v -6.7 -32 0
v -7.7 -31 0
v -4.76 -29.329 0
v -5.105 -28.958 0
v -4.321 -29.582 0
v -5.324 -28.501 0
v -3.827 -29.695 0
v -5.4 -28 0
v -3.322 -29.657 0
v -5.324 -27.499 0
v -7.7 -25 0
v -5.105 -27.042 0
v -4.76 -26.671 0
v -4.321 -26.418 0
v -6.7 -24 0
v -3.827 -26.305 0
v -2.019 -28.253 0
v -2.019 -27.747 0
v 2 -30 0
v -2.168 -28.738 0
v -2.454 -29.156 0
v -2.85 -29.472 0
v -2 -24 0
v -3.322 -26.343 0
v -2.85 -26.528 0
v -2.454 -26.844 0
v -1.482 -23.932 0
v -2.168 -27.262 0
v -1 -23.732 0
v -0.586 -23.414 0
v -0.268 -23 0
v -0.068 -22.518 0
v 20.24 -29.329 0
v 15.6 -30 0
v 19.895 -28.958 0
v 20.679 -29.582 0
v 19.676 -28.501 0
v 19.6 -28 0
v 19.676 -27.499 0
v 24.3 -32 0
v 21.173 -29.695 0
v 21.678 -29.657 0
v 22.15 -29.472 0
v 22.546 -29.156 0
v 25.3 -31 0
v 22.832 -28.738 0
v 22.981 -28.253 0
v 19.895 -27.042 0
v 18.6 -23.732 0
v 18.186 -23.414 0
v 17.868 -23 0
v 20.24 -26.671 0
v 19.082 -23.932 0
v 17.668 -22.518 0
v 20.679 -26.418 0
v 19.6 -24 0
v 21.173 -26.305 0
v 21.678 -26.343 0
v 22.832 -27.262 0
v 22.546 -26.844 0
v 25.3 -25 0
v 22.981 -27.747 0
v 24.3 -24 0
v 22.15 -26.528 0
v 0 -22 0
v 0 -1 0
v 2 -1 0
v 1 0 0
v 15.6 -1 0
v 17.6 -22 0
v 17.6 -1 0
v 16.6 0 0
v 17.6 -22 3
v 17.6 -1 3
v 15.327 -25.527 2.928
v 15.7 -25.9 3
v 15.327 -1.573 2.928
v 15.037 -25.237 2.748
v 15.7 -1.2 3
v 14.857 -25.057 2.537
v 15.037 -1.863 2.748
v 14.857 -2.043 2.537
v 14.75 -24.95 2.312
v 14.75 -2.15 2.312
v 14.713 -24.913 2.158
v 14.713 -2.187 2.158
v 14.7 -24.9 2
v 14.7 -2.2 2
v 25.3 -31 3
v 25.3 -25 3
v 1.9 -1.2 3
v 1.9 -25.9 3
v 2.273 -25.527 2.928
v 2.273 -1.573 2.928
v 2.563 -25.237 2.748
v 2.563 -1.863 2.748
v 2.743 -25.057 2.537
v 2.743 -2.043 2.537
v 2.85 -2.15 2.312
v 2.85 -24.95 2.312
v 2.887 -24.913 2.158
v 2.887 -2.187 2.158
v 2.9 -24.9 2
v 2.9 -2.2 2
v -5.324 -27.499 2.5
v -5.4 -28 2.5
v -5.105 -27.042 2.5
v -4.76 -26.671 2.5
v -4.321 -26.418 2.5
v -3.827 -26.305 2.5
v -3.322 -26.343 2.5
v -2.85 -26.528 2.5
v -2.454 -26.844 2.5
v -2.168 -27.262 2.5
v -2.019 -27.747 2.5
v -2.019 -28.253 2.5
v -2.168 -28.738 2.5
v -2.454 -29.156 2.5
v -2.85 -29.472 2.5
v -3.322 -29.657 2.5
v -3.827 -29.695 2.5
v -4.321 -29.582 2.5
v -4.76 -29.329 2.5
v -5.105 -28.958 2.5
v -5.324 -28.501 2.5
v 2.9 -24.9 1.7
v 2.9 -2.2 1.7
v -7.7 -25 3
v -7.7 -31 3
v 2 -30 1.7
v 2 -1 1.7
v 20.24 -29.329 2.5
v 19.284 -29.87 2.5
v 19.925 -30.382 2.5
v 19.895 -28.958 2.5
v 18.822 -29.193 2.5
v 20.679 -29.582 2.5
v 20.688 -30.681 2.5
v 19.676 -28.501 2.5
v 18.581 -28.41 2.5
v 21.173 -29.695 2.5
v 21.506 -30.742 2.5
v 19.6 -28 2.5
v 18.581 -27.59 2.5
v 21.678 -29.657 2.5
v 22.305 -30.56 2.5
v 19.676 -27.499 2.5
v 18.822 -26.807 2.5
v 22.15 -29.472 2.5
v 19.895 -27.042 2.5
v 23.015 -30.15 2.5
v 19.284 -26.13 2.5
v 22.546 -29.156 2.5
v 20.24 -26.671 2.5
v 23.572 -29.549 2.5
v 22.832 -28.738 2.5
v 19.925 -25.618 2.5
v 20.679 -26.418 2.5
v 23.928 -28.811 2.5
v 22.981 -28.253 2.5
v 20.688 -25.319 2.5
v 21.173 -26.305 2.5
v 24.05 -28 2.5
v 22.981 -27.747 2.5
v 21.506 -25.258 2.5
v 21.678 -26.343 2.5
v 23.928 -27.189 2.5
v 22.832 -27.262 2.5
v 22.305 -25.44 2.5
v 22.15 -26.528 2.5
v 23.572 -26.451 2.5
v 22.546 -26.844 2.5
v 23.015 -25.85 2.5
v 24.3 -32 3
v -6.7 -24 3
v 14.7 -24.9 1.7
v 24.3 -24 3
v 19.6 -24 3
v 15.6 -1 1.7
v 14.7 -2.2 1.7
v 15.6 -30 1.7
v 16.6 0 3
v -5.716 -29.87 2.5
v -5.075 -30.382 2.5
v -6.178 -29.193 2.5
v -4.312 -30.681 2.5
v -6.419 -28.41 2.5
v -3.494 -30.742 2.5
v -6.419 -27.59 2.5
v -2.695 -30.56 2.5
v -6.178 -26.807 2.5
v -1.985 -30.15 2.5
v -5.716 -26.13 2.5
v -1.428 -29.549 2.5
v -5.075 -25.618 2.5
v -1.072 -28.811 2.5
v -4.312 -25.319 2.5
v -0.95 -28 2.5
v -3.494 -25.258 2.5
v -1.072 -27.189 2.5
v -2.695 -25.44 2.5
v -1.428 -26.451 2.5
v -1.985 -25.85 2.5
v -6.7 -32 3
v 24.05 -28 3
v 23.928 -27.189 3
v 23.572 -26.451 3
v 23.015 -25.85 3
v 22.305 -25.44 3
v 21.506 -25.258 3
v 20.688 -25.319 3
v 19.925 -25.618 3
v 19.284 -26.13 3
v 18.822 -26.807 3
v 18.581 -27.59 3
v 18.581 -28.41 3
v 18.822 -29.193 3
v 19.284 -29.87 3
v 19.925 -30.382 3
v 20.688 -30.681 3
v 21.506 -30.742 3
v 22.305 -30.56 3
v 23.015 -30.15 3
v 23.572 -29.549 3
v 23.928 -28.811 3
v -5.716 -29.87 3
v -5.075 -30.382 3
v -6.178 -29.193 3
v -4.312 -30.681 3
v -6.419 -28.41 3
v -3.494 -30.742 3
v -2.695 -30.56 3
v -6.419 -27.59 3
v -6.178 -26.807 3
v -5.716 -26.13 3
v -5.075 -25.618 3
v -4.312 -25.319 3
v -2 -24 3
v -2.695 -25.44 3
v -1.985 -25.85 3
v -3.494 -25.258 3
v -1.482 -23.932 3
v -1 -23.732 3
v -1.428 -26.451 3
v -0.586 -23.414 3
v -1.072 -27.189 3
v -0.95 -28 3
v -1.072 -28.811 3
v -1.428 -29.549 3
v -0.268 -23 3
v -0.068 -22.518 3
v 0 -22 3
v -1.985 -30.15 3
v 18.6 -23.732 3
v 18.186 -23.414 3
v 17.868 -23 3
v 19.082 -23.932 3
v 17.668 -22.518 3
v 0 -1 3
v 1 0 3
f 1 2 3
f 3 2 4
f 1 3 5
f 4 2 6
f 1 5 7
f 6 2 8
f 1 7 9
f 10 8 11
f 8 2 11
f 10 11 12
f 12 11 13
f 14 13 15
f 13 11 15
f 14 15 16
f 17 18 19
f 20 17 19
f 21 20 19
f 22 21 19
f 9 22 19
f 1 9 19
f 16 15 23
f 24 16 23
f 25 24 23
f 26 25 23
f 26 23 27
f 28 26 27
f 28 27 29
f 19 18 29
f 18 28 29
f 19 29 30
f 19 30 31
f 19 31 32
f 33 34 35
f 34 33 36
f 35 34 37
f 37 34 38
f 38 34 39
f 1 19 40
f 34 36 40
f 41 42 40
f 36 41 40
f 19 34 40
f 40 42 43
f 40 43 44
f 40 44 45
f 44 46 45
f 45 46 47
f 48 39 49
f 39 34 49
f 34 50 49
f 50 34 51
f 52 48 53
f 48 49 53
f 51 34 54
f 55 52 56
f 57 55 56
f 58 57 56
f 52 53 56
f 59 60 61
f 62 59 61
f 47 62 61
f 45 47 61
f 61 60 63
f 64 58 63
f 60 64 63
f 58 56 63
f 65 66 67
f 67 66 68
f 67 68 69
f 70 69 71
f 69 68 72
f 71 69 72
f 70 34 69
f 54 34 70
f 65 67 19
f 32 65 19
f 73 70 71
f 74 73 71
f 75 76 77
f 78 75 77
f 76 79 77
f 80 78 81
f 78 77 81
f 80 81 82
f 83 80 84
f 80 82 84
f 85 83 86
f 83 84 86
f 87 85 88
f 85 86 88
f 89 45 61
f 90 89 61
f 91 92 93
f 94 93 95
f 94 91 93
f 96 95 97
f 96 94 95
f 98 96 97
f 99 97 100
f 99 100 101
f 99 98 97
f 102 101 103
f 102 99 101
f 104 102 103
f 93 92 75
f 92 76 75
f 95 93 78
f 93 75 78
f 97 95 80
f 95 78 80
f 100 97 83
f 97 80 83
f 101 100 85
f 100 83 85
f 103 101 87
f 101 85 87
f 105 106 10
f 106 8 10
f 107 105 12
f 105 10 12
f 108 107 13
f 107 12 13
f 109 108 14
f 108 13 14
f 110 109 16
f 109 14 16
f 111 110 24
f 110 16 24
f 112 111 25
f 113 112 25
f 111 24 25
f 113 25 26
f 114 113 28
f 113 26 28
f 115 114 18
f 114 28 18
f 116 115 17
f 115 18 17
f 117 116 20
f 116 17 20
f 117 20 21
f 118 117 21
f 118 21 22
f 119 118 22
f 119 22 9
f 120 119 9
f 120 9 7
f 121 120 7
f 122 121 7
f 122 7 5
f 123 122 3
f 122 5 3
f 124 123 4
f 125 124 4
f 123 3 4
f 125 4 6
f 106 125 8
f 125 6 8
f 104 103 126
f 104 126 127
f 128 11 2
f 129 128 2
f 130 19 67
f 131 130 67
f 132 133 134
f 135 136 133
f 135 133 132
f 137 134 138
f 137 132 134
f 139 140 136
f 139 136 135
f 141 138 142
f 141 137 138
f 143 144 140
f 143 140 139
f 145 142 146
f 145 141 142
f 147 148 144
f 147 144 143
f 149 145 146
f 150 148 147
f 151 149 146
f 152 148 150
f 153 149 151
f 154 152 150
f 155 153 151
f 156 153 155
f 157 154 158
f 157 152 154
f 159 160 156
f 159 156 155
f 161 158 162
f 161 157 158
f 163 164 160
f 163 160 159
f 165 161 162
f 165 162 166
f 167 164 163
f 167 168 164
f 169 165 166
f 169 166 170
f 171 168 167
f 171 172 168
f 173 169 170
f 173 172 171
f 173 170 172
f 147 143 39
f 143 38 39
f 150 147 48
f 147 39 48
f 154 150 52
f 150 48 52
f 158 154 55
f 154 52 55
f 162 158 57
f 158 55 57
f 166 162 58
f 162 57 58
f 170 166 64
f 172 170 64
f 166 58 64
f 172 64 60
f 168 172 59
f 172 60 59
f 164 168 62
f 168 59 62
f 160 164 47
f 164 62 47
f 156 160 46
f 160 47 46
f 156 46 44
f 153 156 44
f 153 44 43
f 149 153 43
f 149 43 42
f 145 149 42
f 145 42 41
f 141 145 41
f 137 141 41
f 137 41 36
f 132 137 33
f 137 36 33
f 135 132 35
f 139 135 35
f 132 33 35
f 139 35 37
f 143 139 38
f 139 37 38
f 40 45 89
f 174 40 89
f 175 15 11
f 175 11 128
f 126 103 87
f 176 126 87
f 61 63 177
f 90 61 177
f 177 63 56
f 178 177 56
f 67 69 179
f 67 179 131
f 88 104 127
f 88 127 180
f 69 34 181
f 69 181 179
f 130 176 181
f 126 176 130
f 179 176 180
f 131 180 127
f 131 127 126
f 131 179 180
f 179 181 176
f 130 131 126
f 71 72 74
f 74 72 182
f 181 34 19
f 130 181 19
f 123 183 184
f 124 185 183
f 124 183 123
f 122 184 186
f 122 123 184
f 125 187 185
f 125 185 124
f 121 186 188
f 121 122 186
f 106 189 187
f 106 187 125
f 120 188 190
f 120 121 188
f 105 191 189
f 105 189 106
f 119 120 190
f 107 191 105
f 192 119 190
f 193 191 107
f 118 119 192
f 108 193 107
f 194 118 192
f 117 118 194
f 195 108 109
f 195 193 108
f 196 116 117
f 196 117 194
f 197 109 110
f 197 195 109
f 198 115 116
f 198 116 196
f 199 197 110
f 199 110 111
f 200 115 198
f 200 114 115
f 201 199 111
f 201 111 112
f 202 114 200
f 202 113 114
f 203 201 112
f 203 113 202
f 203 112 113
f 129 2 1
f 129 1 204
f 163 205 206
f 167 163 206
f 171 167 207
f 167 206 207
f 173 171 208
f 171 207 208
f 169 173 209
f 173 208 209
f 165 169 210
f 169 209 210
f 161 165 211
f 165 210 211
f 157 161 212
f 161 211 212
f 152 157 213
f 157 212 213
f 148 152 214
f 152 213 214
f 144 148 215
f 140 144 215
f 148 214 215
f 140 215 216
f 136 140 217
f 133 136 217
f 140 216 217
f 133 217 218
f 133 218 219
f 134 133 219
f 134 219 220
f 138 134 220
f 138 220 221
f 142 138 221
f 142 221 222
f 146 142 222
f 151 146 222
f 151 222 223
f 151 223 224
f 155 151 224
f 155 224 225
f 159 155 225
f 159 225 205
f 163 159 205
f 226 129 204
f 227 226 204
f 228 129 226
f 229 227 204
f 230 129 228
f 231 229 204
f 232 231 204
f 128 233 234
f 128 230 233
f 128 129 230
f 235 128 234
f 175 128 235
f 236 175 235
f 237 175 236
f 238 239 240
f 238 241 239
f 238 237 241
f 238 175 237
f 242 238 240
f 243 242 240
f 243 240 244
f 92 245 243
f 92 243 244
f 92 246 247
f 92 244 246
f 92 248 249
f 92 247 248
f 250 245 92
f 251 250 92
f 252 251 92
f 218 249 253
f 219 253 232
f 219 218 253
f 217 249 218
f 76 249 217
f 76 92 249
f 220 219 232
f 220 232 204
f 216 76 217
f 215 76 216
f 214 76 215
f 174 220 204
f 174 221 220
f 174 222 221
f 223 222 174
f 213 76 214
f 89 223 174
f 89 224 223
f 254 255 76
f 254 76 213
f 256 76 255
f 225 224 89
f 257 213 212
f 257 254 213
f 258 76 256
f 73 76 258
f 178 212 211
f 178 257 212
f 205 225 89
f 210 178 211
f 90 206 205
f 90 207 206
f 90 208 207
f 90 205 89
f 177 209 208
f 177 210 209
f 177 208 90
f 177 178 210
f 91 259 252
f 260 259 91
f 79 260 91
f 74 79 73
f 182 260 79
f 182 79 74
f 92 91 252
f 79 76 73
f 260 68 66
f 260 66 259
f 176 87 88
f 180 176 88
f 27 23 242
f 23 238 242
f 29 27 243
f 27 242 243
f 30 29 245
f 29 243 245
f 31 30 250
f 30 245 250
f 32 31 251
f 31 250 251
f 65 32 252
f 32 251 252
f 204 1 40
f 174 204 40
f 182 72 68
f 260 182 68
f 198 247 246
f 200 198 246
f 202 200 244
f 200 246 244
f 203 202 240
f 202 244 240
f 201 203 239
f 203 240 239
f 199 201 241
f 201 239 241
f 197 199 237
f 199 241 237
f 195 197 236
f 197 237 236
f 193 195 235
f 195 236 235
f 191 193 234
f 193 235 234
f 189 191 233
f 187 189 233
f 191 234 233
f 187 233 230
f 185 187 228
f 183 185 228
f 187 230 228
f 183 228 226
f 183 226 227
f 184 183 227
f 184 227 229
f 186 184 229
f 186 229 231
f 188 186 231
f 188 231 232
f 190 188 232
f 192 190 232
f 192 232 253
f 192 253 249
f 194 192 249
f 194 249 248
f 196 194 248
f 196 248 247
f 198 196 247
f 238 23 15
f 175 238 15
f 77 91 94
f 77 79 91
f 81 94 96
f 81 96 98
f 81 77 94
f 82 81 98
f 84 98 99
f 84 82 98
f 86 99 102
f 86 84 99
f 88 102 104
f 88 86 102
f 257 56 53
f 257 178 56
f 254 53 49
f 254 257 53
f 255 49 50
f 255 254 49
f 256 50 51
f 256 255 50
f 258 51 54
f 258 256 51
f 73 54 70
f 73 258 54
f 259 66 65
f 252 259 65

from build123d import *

# Parameters (mm, degrees)
EXTRUDE_1_DEPTH              = 3
SKETCH_2_W                   = 13.6
SKETCH_2_H                   = 29
CUT_EXTRUDE_1_DEPTH          = 1.7
SKETCH_3_W                   = 11.8
SKETCH_3_H                   = 22.7
CUT_EXTRUDE_2_DEPTH          = 4
HOLE_WIZARD_M3_1_D           = 3.4
HOLE_WIZARD_M3_1_DEPTH       = 7.5
HOLE_WIZARD_M3_1_CBORE_D     = 5.5
HOLE_WIZARD_M3_1_CBORE_DEPTH = 0.5
HOLE_WIZARD_M3_1_TIP         = 1.021463052
CHAMFER_1_SIZE               = 1
FILLET_1_R                   = 2
FILLET_3_R                   = 1


with BuildPart() as part:
    # 草图1 → 凸台-拉伸1 (new body)
    with BuildSketch(Plane.XY):
        Polygon((-7.7, -32), (25.3, -32), (25.3, -24), (17.6, -24), (17.6, 0), (0, 0), (0, -24), (-7.7, -24), align=None)
    extrude(amount=EXTRUDE_1_DEPTH)

    # 草图2 → 切除-拉伸1 (cut)
    with BuildSketch(Plane(origin=(0, 0, 0), x_dir=(-1, 0, 0), z_dir=(0, 0, -1))):
        with Locations((-8.8, -15.5)):
            Rectangle(SKETCH_2_W, SKETCH_2_H)
    extrude(amount=-CUT_EXTRUDE_1_DEPTH, mode=Mode.SUBTRACT)

    # 草图3 → 切除-拉伸2 (cut, through all)
    with BuildSketch(Plane.XY.offset(3)):
        with Locations((8.8, -13.55)):
            Rectangle(SKETCH_3_W, SKETCH_3_H)
    extrude(amount=-CUT_EXTRUDE_2_DEPTH, mode=Mode.SUBTRACT)

    # M3 六角头螺栓的柱形沉头孔1
    with Locations(Plane.XY.offset(3)):
        with Locations((-3.7, -28), (21.3, -28)):
            CounterBoreHole(HOLE_WIZARD_M3_1_D / 2, HOLE_WIZARD_M3_1_CBORE_D / 2, HOLE_WIZARD_M3_1_CBORE_DEPTH, depth=HOLE_WIZARD_M3_1_DEPTH)
            with Locations((0, 0, -(HOLE_WIZARD_M3_1_DEPTH + HOLE_WIZARD_M3_1_TIP / 2))):  # 118° drill point
                Cone(0, HOLE_WIZARD_M3_1_D / 2, HOLE_WIZARD_M3_1_TIP, mode=Mode.SUBTRACT)

    # 倒角1
    chamfer_1_edges = [part.edges().sort_by_distance(p)[0] for p in [
        (0, 0, 1.5),
        (17.6, 0, 1.5),
        (25.3, -24, 1.5),
        (25.3, -32, 1.5),
        (-7.7, -32, 1.5),
        (-7.7, -24, 1.5),
    ]]
    chamfer(chamfer_1_edges, length=CHAMFER_1_SIZE)

    # 圆角1
    fillet_1_edges = [part.edges().sort_by_distance(p)[0] for p in [
        (17.6, -24, 1.5),
        (0, -24, 1.5),
    ]]
    fillet(fillet_1_edges, radius=FILLET_1_R)

    # 圆角3
    fillet_3_edges = [part.edges().sort_by_distance(p)[0] for p in [
        (2.9, -13.55, 3),
        (8.8, -24.9, 3),
        (14.7, -13.55, 3),
        (8.8, -2.2, 3),
    ]]
    fillet(fillet_3_edges, radius=FILLET_3_R)


solid = part.part
